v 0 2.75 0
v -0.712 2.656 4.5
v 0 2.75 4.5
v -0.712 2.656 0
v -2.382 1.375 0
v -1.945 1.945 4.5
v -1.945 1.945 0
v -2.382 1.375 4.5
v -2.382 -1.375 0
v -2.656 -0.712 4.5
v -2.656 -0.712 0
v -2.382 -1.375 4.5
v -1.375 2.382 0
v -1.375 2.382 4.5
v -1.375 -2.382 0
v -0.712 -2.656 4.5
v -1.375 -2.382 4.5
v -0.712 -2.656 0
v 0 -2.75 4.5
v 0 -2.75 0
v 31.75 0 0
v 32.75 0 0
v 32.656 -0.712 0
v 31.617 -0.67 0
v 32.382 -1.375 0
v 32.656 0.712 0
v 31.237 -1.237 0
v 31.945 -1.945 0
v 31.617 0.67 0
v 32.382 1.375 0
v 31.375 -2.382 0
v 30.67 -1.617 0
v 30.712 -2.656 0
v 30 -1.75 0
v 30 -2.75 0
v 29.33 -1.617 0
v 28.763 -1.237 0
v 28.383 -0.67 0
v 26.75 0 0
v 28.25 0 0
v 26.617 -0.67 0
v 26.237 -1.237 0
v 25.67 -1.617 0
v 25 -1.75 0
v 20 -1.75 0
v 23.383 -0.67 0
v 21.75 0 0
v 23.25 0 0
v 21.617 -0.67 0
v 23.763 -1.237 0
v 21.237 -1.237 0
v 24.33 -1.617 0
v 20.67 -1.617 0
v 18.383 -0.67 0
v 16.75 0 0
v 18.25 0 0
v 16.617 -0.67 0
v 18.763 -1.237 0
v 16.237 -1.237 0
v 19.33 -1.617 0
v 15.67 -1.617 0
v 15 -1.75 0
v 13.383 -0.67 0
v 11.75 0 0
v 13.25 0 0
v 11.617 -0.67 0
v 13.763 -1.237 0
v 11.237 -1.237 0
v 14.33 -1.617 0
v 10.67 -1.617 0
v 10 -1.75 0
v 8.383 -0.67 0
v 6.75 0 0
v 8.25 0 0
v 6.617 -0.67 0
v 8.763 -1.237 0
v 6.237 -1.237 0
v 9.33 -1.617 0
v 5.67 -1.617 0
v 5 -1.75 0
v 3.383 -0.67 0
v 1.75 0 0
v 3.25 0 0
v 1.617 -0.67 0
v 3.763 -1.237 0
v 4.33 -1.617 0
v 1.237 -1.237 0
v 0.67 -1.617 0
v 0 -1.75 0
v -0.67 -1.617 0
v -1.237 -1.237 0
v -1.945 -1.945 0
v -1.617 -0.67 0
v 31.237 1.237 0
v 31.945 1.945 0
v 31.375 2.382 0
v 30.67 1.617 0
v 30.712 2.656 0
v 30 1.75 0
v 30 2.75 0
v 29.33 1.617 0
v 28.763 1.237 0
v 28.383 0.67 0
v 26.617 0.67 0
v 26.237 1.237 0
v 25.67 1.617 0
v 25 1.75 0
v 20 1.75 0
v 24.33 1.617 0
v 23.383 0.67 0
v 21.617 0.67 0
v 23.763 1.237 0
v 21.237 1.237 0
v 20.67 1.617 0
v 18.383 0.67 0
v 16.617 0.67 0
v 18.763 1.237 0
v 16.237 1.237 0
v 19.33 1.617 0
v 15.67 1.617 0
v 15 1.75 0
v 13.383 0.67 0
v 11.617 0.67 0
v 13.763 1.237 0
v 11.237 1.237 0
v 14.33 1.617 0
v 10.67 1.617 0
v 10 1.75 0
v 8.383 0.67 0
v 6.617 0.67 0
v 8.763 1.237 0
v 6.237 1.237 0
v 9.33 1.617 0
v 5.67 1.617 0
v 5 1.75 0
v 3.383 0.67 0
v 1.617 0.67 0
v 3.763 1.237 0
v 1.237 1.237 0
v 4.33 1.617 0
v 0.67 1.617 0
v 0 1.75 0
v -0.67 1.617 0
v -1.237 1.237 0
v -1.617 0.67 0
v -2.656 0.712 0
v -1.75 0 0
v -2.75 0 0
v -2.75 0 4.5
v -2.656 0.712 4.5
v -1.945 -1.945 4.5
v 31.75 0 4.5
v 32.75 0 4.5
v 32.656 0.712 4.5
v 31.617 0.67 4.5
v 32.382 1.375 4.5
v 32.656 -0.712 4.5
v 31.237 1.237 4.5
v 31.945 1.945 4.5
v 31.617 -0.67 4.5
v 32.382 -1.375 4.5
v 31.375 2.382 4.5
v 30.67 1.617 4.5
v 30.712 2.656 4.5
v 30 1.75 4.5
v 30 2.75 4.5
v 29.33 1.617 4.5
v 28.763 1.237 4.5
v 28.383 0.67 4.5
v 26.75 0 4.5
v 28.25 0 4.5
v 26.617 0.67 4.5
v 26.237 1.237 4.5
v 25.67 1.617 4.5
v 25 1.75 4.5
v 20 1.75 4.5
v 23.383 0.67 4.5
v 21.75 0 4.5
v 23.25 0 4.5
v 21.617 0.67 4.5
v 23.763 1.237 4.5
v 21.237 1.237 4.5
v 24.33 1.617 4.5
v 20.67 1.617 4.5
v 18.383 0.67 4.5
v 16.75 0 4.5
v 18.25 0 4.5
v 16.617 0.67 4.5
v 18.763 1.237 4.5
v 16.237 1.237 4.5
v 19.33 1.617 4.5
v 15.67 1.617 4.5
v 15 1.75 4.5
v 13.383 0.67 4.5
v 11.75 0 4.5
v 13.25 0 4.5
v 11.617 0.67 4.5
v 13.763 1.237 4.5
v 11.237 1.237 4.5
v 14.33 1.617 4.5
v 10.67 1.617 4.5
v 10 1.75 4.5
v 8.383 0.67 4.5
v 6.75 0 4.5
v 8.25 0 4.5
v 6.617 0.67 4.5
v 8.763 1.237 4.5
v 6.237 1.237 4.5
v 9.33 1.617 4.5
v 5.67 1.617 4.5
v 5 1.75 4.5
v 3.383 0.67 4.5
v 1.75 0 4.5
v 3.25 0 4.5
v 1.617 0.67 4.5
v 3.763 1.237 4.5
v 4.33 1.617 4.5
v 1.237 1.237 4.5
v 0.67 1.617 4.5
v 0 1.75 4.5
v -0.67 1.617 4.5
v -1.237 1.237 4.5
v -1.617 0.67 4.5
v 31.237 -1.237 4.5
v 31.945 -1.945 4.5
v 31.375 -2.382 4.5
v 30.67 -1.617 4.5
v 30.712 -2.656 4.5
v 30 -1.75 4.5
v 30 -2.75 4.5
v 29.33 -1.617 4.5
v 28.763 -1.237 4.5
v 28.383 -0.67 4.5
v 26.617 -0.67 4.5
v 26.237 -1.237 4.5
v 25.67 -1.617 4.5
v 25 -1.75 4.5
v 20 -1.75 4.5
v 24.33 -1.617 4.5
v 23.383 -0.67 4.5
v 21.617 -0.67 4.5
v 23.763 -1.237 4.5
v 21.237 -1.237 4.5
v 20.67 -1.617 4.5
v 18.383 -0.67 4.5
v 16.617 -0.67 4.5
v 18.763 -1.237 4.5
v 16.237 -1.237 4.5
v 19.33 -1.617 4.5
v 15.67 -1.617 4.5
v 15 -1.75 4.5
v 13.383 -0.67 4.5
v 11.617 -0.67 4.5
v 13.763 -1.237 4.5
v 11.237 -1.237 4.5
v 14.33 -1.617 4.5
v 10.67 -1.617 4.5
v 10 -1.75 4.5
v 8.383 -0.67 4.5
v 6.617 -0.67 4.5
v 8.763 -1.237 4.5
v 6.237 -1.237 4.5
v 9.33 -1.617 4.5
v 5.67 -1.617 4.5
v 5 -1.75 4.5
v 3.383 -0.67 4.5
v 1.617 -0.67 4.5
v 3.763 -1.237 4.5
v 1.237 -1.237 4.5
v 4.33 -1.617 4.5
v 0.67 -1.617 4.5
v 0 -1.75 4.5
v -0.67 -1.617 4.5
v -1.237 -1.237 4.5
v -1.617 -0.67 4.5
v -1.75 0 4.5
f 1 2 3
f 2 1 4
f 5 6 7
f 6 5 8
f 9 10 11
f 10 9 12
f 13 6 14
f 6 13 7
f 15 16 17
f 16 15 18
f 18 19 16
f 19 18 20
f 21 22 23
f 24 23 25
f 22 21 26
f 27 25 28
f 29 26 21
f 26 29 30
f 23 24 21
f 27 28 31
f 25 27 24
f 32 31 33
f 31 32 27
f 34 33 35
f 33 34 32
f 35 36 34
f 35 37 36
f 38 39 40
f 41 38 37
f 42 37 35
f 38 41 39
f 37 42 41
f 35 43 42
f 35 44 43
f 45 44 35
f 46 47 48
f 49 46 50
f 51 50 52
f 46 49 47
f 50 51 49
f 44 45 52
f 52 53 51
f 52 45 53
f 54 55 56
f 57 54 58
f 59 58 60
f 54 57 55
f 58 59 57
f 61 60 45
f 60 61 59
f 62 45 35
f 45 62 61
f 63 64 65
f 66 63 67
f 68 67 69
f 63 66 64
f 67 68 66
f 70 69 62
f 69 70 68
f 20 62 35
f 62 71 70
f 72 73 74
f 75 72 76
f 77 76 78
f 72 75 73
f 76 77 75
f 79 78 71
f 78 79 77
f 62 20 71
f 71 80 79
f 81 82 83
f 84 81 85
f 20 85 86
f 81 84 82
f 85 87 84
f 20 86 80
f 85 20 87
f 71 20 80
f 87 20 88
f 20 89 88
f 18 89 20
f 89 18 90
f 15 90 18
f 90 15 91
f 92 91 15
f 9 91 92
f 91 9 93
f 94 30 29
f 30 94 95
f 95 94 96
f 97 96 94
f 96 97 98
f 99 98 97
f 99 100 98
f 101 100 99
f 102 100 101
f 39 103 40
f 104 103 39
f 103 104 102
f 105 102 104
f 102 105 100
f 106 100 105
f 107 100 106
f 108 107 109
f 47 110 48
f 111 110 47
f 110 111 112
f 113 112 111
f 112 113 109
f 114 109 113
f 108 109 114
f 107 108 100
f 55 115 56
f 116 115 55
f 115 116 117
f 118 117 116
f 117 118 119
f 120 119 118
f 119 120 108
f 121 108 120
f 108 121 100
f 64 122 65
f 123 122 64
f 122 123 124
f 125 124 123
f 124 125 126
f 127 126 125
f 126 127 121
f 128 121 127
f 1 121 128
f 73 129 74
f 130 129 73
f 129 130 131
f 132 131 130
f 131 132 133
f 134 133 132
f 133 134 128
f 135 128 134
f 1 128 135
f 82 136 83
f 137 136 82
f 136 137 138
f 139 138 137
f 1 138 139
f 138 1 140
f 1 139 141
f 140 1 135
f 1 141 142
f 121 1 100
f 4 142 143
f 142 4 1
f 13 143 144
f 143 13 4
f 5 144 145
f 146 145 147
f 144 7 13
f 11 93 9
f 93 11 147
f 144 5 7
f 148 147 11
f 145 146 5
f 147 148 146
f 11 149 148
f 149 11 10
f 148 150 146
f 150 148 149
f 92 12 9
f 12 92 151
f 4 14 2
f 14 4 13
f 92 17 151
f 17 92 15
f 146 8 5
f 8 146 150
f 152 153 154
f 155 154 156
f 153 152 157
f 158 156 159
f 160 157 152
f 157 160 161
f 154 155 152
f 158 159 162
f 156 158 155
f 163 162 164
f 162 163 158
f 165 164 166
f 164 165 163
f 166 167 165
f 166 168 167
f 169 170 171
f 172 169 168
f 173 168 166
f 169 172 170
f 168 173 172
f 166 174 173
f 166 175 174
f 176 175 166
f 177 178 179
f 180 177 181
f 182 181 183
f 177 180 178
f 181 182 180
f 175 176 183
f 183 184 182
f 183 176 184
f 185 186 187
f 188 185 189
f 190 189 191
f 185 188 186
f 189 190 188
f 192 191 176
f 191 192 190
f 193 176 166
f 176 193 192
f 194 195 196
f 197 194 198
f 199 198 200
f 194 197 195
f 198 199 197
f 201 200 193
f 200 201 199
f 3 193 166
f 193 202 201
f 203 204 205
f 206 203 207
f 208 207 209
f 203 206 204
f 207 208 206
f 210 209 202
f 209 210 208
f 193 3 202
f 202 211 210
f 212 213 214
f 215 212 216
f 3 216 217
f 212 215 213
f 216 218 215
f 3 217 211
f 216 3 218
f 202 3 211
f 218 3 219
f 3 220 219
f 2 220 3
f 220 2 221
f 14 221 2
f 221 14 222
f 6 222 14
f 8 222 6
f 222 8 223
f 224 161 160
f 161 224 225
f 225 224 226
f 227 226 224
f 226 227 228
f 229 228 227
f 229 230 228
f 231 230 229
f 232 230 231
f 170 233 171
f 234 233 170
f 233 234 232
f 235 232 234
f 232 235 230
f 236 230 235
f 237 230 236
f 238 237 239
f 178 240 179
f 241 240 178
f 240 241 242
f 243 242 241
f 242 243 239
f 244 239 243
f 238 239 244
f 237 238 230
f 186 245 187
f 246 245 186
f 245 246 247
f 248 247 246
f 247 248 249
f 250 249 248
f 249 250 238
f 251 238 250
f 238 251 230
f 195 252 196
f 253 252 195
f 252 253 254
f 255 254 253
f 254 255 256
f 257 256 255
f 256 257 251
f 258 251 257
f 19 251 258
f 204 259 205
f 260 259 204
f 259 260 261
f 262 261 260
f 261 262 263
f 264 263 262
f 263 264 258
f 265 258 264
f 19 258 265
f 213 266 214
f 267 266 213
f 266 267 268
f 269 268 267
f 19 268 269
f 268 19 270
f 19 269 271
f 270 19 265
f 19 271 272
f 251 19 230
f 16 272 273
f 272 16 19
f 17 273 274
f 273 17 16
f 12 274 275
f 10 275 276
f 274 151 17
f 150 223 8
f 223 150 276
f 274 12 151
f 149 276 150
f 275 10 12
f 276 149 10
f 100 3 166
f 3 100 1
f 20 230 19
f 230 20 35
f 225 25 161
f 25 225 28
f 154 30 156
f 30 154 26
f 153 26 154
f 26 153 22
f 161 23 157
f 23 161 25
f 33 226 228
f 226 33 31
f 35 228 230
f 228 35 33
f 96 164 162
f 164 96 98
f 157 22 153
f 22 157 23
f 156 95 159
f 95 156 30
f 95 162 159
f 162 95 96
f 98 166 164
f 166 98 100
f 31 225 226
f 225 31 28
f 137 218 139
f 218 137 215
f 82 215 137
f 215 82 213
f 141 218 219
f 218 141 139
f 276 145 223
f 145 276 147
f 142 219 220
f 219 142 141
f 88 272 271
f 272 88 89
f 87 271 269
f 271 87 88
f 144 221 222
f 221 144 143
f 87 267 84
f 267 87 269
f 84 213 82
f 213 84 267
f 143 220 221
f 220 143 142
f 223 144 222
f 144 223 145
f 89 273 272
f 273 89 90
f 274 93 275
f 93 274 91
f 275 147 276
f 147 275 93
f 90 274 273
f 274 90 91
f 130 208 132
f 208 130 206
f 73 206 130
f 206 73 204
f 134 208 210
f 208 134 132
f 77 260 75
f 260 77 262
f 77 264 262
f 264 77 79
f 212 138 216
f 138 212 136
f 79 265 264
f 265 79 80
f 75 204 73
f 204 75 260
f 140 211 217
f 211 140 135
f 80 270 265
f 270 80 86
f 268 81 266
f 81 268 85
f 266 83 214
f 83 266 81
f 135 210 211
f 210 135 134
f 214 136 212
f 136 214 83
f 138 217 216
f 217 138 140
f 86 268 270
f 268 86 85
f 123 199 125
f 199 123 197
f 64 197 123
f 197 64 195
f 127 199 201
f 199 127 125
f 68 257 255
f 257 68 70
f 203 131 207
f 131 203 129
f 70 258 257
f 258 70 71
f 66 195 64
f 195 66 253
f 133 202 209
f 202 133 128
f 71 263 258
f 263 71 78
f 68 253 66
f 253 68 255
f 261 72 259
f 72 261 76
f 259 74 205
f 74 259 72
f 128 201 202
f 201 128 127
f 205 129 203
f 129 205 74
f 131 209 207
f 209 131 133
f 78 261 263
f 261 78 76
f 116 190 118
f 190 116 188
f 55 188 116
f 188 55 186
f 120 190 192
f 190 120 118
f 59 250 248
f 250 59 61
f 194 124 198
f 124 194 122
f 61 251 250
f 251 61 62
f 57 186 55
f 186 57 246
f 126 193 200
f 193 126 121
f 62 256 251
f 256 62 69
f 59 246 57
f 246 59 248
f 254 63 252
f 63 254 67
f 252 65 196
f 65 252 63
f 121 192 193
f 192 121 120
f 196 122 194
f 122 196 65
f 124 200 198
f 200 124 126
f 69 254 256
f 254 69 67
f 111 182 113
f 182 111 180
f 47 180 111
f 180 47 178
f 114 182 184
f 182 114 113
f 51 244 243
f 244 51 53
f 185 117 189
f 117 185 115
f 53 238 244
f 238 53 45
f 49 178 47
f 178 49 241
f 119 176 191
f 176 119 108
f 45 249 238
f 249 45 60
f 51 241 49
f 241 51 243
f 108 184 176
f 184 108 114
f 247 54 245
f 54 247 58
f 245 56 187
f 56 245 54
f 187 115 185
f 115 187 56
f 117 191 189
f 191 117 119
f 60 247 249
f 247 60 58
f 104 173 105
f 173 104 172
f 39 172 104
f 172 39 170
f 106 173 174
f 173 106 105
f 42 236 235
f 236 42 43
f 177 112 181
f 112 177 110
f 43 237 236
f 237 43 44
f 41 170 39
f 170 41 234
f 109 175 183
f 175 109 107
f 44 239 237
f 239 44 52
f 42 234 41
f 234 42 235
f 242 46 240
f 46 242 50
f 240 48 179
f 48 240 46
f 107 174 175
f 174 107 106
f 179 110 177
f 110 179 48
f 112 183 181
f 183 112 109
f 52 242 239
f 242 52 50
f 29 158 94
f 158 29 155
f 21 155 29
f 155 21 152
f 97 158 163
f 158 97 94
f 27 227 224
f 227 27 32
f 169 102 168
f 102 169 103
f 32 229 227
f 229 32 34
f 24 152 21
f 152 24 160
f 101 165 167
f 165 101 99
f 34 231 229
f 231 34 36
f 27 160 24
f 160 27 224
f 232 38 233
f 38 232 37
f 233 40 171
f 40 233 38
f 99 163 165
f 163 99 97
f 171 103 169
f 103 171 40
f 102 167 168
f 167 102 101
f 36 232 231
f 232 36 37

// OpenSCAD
difference() {
  union() {
    cylinder(r = 5.5/2, h = 4.5, $fn = 24);
    translate(v = [0,-5.5/2,0])
      cube(size = [30,5.5,4.5]);
    translate([30,0,0])
      cylinder(r = 5.5/2, h = 4.5, $fn = 24);
  }

  for(i = [0:6])
    translate(v = [i*5,0,-1])
      cylinder(r = 3.5/2, h = 4.5+2, $fn = 16);
}
